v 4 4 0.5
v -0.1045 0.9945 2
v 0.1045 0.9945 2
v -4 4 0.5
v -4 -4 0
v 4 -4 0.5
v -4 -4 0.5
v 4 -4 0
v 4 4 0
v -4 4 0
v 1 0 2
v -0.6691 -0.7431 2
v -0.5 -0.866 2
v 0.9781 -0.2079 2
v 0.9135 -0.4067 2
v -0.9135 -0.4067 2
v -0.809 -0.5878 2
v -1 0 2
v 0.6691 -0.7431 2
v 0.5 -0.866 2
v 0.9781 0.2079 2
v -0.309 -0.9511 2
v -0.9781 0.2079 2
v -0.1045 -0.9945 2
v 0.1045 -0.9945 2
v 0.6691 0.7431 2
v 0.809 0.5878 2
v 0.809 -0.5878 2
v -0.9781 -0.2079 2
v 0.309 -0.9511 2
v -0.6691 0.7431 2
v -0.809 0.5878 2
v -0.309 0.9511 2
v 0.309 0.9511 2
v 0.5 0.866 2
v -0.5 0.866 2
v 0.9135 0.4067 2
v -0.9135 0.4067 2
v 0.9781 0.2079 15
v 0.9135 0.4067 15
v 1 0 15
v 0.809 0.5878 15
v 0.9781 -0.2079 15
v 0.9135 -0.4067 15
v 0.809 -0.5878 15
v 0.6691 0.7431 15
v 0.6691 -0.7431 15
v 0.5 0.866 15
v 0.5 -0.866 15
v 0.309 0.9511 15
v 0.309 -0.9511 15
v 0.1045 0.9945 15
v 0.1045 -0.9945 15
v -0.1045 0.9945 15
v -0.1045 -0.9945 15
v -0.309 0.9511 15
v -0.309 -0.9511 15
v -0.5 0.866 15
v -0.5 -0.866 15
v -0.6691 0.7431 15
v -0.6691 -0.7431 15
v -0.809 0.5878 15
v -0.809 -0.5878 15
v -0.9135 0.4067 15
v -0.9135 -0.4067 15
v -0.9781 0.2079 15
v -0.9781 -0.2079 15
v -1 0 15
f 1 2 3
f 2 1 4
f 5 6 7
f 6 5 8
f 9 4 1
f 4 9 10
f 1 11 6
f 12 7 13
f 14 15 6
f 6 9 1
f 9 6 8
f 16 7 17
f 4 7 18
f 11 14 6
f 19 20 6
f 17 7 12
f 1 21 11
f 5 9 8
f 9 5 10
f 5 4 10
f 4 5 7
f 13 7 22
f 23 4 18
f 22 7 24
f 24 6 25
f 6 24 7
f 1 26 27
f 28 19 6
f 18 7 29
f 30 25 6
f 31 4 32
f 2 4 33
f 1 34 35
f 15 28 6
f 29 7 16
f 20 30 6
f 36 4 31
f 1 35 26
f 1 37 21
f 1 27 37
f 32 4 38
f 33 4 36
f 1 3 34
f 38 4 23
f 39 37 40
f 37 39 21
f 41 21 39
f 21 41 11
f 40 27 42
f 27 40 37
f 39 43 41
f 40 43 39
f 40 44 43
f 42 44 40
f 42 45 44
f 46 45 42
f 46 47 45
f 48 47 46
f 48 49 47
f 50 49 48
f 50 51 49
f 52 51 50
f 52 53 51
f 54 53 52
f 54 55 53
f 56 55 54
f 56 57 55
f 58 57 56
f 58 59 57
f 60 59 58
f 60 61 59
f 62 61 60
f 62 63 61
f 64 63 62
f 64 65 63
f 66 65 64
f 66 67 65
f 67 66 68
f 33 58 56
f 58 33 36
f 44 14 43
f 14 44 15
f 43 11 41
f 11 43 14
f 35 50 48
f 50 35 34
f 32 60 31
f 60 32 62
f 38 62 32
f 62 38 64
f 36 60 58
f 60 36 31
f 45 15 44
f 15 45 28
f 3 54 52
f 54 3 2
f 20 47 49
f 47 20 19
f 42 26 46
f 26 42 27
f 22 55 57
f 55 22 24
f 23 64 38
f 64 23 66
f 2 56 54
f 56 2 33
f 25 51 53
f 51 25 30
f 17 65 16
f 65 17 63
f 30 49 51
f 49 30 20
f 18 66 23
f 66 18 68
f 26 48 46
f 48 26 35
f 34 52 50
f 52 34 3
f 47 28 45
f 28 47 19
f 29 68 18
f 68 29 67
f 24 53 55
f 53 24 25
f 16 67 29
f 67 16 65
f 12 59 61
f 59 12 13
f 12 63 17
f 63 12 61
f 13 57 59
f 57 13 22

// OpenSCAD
$fs=.2;

module base() {
	hull() {
	  translate([-4,-4,0]) cube([8,8,.5]);
	  cylinder(h=2, r=1);
	}
	cylinder(h=15, r=1);
}

base();
